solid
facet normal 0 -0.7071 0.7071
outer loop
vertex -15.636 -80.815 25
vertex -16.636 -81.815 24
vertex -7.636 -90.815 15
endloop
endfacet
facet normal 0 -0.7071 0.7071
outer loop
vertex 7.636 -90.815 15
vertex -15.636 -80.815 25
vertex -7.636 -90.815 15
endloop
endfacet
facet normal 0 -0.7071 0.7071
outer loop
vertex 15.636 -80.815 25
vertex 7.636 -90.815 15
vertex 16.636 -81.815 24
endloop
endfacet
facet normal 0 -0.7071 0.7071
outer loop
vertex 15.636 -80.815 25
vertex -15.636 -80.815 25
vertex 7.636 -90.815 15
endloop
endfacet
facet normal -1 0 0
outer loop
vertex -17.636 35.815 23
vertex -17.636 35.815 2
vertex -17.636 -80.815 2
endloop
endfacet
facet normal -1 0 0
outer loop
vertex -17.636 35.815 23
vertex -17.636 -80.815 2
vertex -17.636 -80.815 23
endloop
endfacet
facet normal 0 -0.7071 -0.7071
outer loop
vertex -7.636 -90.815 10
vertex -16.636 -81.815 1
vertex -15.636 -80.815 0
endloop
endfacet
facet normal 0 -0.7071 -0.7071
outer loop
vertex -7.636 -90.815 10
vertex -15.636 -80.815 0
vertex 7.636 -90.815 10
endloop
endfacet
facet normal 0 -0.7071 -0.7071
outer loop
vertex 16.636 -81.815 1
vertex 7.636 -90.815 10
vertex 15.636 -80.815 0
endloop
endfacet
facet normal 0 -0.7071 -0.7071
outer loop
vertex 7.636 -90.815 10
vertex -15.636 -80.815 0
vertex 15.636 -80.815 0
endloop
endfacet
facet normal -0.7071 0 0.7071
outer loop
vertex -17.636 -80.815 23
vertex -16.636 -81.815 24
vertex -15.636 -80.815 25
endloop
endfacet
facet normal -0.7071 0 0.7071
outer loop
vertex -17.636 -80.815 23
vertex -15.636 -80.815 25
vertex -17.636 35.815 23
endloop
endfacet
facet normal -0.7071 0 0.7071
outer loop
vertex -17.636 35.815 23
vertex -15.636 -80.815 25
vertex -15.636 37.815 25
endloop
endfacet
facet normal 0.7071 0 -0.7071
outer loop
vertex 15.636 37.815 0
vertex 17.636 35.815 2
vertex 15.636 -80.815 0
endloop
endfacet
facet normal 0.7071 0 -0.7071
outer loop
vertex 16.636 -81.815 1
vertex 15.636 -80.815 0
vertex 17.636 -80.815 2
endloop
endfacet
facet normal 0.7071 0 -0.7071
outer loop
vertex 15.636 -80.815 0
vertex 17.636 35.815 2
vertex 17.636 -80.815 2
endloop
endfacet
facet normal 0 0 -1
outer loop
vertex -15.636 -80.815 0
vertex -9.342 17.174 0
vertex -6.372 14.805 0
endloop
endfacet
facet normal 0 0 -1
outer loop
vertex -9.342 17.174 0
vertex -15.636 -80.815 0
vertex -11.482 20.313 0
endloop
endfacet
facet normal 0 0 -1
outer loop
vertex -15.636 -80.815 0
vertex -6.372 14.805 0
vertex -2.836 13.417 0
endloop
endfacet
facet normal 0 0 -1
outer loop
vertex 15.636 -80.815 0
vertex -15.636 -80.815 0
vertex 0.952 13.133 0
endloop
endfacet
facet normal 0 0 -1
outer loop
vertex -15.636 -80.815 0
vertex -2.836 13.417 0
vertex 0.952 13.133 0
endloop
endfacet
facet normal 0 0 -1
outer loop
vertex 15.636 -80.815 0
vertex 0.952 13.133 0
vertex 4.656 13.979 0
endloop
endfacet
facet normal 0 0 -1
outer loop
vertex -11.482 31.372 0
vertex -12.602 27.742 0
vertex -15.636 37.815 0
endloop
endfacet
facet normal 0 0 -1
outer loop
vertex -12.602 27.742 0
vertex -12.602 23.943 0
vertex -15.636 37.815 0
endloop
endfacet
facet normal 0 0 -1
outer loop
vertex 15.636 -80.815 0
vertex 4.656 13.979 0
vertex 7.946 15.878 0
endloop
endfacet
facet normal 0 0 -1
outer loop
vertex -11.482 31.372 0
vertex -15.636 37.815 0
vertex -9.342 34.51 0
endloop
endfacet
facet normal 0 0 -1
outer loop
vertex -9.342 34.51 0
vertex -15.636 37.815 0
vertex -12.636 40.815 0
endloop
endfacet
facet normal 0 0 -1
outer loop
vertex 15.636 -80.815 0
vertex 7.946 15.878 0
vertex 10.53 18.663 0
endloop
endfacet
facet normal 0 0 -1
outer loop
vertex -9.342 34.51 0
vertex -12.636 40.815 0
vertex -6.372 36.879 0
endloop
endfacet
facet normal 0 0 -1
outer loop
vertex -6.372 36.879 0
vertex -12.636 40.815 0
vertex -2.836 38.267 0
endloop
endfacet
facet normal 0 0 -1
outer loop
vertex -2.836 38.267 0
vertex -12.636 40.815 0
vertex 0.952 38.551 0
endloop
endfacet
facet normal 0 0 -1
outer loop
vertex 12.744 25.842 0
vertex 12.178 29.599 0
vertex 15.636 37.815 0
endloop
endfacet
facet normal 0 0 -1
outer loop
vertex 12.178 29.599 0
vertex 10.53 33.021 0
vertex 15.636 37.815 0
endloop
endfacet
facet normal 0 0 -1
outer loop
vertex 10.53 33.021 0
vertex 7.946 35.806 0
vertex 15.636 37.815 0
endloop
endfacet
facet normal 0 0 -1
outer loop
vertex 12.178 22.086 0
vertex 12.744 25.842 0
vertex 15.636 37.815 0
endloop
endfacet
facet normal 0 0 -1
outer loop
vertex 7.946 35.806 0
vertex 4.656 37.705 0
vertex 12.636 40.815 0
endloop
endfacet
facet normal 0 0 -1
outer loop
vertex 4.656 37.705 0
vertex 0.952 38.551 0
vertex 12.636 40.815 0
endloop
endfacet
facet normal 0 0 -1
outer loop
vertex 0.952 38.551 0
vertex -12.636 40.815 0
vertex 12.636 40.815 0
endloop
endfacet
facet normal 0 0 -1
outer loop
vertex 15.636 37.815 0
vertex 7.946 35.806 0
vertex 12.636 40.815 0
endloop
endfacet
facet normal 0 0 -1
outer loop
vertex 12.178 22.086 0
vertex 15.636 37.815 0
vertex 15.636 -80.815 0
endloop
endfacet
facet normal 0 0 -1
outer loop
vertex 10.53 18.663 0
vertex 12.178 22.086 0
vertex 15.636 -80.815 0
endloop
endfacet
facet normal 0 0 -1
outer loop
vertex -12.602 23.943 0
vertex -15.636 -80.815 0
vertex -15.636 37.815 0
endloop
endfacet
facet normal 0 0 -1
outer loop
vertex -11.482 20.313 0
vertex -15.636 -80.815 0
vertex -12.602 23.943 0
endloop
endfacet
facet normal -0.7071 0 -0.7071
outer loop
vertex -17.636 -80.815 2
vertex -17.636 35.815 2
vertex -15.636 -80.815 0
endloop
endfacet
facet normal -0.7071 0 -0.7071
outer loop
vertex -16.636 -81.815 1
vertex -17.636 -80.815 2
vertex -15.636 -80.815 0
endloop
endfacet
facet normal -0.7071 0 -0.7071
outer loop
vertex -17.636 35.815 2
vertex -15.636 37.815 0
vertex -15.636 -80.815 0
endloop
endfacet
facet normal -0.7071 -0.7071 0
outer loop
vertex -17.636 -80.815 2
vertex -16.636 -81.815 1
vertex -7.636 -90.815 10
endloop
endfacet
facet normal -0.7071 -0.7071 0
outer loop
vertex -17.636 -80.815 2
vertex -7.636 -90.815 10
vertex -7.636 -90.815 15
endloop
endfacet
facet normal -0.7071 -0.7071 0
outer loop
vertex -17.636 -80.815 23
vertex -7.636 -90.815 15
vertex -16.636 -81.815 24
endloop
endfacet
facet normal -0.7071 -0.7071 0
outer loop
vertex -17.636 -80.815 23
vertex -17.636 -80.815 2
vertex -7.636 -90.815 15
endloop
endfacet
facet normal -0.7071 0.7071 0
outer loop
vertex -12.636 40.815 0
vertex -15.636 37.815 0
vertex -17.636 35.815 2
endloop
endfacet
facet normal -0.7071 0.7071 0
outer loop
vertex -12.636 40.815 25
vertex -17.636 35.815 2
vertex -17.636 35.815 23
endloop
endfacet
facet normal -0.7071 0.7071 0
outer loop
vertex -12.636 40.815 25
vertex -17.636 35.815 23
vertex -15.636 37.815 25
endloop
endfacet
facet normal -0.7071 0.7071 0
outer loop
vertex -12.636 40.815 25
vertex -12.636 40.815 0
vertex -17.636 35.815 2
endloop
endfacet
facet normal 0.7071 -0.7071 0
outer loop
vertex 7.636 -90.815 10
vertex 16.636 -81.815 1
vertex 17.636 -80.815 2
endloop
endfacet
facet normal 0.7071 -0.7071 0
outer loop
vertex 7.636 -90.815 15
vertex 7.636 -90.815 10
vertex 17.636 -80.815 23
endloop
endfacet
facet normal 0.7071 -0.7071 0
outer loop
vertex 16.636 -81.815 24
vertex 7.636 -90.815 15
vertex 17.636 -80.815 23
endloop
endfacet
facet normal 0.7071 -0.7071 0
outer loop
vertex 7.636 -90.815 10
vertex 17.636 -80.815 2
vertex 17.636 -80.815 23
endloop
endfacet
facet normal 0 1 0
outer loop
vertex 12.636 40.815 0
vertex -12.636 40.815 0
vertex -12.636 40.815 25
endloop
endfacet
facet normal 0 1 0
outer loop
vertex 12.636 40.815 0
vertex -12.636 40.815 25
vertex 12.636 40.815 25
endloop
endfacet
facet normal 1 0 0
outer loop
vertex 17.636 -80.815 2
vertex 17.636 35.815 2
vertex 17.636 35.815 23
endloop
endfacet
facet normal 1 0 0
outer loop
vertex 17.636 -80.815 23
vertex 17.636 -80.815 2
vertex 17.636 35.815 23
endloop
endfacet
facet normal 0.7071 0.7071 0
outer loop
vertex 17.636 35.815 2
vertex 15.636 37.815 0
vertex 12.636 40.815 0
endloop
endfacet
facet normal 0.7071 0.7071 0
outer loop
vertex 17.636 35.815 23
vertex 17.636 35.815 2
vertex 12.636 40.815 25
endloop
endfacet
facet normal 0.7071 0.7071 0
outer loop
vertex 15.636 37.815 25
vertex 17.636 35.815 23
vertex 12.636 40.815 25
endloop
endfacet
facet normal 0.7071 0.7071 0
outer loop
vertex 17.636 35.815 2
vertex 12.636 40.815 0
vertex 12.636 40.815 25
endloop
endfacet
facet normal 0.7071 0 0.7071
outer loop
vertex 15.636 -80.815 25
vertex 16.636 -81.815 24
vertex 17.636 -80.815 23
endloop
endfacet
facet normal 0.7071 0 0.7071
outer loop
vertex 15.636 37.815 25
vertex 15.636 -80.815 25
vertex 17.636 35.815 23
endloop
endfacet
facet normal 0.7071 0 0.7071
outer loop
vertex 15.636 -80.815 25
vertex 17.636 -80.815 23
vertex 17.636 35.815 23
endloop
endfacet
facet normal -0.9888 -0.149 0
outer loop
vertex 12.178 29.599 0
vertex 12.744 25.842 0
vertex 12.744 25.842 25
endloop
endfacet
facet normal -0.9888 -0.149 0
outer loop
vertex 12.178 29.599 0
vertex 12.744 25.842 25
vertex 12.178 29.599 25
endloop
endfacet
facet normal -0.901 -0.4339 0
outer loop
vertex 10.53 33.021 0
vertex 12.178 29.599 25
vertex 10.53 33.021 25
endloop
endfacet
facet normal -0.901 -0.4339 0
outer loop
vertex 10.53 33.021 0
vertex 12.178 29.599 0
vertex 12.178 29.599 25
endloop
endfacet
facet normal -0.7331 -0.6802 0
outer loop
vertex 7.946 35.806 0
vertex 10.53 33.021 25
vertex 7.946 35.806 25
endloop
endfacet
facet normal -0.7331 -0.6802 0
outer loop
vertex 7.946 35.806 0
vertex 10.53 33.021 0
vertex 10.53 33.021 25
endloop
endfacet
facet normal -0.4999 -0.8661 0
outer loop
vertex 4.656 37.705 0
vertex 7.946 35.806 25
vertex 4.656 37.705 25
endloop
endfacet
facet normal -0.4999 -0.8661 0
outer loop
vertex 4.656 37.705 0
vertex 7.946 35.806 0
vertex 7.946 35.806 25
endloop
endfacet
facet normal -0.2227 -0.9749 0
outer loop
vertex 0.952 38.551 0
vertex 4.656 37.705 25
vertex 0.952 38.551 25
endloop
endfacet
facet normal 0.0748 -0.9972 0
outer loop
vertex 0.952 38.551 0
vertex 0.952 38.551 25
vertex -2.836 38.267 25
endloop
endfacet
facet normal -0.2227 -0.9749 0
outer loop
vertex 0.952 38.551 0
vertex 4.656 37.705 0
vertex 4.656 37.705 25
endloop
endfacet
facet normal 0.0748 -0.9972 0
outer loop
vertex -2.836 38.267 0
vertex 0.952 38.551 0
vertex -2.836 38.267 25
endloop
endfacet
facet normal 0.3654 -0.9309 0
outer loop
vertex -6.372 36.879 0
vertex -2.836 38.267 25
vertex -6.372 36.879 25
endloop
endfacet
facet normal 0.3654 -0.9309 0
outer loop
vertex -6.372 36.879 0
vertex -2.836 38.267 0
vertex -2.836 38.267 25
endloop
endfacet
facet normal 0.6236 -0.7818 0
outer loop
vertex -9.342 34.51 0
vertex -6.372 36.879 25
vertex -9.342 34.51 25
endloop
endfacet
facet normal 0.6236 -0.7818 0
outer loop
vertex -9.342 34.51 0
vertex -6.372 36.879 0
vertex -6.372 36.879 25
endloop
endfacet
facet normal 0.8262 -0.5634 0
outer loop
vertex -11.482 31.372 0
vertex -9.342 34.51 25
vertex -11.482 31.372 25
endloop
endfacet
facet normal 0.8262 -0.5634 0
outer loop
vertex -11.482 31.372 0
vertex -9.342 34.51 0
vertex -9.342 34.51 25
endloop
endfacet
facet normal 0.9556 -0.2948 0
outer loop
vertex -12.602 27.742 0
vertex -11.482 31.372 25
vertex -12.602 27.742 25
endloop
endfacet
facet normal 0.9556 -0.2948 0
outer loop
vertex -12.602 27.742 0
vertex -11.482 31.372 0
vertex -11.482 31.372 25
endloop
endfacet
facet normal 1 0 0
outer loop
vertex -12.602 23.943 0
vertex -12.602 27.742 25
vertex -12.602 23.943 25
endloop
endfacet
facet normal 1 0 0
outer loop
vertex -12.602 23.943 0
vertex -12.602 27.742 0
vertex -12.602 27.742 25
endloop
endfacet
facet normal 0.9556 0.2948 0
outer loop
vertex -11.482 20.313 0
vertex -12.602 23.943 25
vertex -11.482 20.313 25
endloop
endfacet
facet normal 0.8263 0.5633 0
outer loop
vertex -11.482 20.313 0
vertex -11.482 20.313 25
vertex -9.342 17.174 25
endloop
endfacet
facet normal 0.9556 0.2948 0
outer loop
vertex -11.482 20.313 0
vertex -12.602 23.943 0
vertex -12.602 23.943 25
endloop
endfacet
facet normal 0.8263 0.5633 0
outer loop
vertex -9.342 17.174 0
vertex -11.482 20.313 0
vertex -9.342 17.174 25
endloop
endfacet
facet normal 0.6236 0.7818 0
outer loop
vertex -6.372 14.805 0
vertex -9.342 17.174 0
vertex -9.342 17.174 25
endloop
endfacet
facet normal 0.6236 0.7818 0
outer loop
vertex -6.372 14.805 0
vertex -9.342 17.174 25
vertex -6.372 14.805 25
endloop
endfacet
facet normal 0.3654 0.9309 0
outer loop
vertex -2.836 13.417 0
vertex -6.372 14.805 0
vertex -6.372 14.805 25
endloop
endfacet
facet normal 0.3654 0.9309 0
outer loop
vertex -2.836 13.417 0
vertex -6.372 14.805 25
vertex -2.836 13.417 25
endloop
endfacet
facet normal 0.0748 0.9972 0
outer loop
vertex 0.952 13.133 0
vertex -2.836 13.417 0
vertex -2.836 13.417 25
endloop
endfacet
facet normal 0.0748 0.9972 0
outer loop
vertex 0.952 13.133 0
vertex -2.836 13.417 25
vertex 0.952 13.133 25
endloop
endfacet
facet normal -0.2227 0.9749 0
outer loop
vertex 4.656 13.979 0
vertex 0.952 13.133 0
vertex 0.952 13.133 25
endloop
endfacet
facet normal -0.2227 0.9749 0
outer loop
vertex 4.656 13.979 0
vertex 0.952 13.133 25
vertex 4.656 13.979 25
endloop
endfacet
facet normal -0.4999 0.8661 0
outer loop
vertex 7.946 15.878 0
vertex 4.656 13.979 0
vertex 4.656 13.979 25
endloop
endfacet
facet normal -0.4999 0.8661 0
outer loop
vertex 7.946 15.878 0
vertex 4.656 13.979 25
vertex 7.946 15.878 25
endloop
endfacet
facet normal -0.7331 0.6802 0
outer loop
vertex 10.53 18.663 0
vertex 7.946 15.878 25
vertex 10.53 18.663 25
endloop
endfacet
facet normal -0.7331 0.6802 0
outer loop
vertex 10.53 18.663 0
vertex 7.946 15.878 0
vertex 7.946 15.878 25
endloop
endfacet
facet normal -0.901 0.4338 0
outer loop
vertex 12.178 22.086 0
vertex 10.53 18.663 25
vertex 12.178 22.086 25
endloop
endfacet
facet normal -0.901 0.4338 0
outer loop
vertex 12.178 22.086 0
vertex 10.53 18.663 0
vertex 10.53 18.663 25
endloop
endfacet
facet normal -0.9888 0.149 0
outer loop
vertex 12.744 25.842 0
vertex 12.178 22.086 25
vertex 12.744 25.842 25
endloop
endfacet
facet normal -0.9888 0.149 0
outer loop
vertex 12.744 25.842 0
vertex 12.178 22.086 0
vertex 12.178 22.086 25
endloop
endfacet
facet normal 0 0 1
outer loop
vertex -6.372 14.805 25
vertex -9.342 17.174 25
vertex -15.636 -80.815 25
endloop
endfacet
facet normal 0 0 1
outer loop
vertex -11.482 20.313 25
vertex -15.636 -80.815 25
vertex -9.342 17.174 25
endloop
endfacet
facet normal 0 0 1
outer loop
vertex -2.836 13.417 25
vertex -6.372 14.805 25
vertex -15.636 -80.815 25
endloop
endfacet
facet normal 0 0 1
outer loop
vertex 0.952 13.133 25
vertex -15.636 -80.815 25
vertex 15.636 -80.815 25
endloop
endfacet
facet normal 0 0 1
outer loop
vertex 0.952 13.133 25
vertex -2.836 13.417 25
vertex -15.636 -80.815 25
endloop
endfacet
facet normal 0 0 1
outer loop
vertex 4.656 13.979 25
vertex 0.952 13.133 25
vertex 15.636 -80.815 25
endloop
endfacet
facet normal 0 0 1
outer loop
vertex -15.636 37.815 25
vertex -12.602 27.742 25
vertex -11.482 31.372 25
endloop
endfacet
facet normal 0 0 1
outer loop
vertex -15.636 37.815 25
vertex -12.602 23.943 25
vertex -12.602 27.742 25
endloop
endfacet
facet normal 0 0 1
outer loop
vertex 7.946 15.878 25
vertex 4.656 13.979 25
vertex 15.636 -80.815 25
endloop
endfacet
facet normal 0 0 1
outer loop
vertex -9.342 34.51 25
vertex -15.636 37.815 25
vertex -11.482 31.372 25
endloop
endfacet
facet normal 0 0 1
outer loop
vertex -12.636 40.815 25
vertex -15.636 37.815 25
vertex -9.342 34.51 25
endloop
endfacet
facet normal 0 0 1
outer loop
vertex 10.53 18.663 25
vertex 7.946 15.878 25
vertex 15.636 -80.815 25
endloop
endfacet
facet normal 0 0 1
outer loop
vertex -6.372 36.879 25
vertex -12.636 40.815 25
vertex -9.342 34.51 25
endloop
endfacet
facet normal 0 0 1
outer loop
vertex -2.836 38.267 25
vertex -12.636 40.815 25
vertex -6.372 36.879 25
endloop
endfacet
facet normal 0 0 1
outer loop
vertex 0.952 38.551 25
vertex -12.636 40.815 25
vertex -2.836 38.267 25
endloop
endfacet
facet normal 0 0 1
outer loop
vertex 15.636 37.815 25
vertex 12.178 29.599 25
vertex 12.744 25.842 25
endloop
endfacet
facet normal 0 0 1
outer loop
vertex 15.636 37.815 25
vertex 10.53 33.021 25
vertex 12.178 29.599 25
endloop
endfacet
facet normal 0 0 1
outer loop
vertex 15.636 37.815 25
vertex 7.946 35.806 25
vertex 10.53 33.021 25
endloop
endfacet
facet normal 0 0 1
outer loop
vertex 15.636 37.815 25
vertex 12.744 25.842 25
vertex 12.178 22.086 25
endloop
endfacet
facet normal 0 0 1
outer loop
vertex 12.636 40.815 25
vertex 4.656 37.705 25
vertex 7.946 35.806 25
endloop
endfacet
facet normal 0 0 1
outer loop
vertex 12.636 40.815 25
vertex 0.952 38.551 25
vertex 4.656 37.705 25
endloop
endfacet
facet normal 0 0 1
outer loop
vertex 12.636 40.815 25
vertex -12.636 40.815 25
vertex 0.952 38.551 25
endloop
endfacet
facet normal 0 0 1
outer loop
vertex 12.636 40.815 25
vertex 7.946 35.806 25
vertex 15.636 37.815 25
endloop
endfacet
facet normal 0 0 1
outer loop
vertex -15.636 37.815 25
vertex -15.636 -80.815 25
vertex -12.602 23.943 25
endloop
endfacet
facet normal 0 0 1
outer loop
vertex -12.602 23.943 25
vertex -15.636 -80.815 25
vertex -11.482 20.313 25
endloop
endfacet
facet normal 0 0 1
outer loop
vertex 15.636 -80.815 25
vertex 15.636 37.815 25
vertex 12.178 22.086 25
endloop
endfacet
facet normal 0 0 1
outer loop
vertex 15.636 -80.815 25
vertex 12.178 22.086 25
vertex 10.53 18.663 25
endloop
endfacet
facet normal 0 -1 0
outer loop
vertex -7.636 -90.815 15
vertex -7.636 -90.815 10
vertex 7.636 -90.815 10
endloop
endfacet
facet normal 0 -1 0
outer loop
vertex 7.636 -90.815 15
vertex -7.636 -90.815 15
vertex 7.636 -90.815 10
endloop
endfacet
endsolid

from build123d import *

# Parameters (mm, degrees)
F0_W     = 35.2719388902
F0_H     = 81.6293433309
F1_DEPTH = 25
F2_R     = 12.7443419247
F3_DEPTH = 25
F4_DEPTH = 50
F5_SIZE  = 5
F6_SIZE  = 2
F7_SIZE  = 10


with BuildPart() as f1:
    # F0 (on Top) → F1 (new body)
    with BuildSketch(Plane.XY):
        Rectangle(F0_W, F0_H)
    extrude(amount=F1_DEPTH)

    # F2 (on Top) → F3 (cut)
    with BuildSketch(Plane.XY):
        with Locations((0, 25.8420929313)):
            Circle(F2_R)
    extrude(amount=F3_DEPTH, mode=Mode.SUBTRACT)

    # F4 (add): a face of the model
    f4_faces = [f1.faces().sort_by_distance(p)[0] for p in [
        (0, -40.8146716654, 12.5),
    ]]
    extrude(f4_faces, amount=F4_DEPTH)

    # F5
    f5_edges = [f1.edges().sort_by_distance(p)[0] for p in [
        (-17.635969, 40.814672, 12.5),
        (17.635969, 40.814672, 12.5),
    ]]
    chamfer(f5_edges, length=F5_SIZE)

    # F6
    f6_edges = [f1.edges().sort_by_distance(p)[0] for p in [
        (17.635969, -27.5, 25),
        (-17.635969, -27.5, 25),
        (17.635969, -27.5, 0),
        (-17.635969, -27.5, 0),
    ]]
    chamfer(f6_edges, length=F6_SIZE)

    # F7 (call 1 of 4: OpenCascade refuses the feature's edges together)
    f7_edges = [f1.edges().sort_by_distance(p)[0] for p in [
        (0, -90.814672, 25),
    ]]
    chamfer(f7_edges, length=F7_SIZE)

    # F7#2 (call 2 of 4)
    f7_2_edges = [f1.edges().sort_by_distance(p)[0] for p in [
        (17.635969, -90.814672, 12.5),
    ]]
    chamfer(f7_2_edges, length=F7_SIZE)

    # F7#3 (call 3 of 4)
    f7_3_edges = [f1.edges().sort_by_distance(p)[0] for p in [
        (0, -90.814672, 0),
    ]]
    chamfer(f7_3_edges, length=F7_SIZE)

    # F7#4 (call 4 of 4)
    f7_4_edges = [f1.edges().sort_by_distance(p)[0] for p in [
        (-17.635969, -90.814672, 12.5),
    ]]
    chamfer(f7_4_edges, length=F7_SIZE)


solid = f1.part
